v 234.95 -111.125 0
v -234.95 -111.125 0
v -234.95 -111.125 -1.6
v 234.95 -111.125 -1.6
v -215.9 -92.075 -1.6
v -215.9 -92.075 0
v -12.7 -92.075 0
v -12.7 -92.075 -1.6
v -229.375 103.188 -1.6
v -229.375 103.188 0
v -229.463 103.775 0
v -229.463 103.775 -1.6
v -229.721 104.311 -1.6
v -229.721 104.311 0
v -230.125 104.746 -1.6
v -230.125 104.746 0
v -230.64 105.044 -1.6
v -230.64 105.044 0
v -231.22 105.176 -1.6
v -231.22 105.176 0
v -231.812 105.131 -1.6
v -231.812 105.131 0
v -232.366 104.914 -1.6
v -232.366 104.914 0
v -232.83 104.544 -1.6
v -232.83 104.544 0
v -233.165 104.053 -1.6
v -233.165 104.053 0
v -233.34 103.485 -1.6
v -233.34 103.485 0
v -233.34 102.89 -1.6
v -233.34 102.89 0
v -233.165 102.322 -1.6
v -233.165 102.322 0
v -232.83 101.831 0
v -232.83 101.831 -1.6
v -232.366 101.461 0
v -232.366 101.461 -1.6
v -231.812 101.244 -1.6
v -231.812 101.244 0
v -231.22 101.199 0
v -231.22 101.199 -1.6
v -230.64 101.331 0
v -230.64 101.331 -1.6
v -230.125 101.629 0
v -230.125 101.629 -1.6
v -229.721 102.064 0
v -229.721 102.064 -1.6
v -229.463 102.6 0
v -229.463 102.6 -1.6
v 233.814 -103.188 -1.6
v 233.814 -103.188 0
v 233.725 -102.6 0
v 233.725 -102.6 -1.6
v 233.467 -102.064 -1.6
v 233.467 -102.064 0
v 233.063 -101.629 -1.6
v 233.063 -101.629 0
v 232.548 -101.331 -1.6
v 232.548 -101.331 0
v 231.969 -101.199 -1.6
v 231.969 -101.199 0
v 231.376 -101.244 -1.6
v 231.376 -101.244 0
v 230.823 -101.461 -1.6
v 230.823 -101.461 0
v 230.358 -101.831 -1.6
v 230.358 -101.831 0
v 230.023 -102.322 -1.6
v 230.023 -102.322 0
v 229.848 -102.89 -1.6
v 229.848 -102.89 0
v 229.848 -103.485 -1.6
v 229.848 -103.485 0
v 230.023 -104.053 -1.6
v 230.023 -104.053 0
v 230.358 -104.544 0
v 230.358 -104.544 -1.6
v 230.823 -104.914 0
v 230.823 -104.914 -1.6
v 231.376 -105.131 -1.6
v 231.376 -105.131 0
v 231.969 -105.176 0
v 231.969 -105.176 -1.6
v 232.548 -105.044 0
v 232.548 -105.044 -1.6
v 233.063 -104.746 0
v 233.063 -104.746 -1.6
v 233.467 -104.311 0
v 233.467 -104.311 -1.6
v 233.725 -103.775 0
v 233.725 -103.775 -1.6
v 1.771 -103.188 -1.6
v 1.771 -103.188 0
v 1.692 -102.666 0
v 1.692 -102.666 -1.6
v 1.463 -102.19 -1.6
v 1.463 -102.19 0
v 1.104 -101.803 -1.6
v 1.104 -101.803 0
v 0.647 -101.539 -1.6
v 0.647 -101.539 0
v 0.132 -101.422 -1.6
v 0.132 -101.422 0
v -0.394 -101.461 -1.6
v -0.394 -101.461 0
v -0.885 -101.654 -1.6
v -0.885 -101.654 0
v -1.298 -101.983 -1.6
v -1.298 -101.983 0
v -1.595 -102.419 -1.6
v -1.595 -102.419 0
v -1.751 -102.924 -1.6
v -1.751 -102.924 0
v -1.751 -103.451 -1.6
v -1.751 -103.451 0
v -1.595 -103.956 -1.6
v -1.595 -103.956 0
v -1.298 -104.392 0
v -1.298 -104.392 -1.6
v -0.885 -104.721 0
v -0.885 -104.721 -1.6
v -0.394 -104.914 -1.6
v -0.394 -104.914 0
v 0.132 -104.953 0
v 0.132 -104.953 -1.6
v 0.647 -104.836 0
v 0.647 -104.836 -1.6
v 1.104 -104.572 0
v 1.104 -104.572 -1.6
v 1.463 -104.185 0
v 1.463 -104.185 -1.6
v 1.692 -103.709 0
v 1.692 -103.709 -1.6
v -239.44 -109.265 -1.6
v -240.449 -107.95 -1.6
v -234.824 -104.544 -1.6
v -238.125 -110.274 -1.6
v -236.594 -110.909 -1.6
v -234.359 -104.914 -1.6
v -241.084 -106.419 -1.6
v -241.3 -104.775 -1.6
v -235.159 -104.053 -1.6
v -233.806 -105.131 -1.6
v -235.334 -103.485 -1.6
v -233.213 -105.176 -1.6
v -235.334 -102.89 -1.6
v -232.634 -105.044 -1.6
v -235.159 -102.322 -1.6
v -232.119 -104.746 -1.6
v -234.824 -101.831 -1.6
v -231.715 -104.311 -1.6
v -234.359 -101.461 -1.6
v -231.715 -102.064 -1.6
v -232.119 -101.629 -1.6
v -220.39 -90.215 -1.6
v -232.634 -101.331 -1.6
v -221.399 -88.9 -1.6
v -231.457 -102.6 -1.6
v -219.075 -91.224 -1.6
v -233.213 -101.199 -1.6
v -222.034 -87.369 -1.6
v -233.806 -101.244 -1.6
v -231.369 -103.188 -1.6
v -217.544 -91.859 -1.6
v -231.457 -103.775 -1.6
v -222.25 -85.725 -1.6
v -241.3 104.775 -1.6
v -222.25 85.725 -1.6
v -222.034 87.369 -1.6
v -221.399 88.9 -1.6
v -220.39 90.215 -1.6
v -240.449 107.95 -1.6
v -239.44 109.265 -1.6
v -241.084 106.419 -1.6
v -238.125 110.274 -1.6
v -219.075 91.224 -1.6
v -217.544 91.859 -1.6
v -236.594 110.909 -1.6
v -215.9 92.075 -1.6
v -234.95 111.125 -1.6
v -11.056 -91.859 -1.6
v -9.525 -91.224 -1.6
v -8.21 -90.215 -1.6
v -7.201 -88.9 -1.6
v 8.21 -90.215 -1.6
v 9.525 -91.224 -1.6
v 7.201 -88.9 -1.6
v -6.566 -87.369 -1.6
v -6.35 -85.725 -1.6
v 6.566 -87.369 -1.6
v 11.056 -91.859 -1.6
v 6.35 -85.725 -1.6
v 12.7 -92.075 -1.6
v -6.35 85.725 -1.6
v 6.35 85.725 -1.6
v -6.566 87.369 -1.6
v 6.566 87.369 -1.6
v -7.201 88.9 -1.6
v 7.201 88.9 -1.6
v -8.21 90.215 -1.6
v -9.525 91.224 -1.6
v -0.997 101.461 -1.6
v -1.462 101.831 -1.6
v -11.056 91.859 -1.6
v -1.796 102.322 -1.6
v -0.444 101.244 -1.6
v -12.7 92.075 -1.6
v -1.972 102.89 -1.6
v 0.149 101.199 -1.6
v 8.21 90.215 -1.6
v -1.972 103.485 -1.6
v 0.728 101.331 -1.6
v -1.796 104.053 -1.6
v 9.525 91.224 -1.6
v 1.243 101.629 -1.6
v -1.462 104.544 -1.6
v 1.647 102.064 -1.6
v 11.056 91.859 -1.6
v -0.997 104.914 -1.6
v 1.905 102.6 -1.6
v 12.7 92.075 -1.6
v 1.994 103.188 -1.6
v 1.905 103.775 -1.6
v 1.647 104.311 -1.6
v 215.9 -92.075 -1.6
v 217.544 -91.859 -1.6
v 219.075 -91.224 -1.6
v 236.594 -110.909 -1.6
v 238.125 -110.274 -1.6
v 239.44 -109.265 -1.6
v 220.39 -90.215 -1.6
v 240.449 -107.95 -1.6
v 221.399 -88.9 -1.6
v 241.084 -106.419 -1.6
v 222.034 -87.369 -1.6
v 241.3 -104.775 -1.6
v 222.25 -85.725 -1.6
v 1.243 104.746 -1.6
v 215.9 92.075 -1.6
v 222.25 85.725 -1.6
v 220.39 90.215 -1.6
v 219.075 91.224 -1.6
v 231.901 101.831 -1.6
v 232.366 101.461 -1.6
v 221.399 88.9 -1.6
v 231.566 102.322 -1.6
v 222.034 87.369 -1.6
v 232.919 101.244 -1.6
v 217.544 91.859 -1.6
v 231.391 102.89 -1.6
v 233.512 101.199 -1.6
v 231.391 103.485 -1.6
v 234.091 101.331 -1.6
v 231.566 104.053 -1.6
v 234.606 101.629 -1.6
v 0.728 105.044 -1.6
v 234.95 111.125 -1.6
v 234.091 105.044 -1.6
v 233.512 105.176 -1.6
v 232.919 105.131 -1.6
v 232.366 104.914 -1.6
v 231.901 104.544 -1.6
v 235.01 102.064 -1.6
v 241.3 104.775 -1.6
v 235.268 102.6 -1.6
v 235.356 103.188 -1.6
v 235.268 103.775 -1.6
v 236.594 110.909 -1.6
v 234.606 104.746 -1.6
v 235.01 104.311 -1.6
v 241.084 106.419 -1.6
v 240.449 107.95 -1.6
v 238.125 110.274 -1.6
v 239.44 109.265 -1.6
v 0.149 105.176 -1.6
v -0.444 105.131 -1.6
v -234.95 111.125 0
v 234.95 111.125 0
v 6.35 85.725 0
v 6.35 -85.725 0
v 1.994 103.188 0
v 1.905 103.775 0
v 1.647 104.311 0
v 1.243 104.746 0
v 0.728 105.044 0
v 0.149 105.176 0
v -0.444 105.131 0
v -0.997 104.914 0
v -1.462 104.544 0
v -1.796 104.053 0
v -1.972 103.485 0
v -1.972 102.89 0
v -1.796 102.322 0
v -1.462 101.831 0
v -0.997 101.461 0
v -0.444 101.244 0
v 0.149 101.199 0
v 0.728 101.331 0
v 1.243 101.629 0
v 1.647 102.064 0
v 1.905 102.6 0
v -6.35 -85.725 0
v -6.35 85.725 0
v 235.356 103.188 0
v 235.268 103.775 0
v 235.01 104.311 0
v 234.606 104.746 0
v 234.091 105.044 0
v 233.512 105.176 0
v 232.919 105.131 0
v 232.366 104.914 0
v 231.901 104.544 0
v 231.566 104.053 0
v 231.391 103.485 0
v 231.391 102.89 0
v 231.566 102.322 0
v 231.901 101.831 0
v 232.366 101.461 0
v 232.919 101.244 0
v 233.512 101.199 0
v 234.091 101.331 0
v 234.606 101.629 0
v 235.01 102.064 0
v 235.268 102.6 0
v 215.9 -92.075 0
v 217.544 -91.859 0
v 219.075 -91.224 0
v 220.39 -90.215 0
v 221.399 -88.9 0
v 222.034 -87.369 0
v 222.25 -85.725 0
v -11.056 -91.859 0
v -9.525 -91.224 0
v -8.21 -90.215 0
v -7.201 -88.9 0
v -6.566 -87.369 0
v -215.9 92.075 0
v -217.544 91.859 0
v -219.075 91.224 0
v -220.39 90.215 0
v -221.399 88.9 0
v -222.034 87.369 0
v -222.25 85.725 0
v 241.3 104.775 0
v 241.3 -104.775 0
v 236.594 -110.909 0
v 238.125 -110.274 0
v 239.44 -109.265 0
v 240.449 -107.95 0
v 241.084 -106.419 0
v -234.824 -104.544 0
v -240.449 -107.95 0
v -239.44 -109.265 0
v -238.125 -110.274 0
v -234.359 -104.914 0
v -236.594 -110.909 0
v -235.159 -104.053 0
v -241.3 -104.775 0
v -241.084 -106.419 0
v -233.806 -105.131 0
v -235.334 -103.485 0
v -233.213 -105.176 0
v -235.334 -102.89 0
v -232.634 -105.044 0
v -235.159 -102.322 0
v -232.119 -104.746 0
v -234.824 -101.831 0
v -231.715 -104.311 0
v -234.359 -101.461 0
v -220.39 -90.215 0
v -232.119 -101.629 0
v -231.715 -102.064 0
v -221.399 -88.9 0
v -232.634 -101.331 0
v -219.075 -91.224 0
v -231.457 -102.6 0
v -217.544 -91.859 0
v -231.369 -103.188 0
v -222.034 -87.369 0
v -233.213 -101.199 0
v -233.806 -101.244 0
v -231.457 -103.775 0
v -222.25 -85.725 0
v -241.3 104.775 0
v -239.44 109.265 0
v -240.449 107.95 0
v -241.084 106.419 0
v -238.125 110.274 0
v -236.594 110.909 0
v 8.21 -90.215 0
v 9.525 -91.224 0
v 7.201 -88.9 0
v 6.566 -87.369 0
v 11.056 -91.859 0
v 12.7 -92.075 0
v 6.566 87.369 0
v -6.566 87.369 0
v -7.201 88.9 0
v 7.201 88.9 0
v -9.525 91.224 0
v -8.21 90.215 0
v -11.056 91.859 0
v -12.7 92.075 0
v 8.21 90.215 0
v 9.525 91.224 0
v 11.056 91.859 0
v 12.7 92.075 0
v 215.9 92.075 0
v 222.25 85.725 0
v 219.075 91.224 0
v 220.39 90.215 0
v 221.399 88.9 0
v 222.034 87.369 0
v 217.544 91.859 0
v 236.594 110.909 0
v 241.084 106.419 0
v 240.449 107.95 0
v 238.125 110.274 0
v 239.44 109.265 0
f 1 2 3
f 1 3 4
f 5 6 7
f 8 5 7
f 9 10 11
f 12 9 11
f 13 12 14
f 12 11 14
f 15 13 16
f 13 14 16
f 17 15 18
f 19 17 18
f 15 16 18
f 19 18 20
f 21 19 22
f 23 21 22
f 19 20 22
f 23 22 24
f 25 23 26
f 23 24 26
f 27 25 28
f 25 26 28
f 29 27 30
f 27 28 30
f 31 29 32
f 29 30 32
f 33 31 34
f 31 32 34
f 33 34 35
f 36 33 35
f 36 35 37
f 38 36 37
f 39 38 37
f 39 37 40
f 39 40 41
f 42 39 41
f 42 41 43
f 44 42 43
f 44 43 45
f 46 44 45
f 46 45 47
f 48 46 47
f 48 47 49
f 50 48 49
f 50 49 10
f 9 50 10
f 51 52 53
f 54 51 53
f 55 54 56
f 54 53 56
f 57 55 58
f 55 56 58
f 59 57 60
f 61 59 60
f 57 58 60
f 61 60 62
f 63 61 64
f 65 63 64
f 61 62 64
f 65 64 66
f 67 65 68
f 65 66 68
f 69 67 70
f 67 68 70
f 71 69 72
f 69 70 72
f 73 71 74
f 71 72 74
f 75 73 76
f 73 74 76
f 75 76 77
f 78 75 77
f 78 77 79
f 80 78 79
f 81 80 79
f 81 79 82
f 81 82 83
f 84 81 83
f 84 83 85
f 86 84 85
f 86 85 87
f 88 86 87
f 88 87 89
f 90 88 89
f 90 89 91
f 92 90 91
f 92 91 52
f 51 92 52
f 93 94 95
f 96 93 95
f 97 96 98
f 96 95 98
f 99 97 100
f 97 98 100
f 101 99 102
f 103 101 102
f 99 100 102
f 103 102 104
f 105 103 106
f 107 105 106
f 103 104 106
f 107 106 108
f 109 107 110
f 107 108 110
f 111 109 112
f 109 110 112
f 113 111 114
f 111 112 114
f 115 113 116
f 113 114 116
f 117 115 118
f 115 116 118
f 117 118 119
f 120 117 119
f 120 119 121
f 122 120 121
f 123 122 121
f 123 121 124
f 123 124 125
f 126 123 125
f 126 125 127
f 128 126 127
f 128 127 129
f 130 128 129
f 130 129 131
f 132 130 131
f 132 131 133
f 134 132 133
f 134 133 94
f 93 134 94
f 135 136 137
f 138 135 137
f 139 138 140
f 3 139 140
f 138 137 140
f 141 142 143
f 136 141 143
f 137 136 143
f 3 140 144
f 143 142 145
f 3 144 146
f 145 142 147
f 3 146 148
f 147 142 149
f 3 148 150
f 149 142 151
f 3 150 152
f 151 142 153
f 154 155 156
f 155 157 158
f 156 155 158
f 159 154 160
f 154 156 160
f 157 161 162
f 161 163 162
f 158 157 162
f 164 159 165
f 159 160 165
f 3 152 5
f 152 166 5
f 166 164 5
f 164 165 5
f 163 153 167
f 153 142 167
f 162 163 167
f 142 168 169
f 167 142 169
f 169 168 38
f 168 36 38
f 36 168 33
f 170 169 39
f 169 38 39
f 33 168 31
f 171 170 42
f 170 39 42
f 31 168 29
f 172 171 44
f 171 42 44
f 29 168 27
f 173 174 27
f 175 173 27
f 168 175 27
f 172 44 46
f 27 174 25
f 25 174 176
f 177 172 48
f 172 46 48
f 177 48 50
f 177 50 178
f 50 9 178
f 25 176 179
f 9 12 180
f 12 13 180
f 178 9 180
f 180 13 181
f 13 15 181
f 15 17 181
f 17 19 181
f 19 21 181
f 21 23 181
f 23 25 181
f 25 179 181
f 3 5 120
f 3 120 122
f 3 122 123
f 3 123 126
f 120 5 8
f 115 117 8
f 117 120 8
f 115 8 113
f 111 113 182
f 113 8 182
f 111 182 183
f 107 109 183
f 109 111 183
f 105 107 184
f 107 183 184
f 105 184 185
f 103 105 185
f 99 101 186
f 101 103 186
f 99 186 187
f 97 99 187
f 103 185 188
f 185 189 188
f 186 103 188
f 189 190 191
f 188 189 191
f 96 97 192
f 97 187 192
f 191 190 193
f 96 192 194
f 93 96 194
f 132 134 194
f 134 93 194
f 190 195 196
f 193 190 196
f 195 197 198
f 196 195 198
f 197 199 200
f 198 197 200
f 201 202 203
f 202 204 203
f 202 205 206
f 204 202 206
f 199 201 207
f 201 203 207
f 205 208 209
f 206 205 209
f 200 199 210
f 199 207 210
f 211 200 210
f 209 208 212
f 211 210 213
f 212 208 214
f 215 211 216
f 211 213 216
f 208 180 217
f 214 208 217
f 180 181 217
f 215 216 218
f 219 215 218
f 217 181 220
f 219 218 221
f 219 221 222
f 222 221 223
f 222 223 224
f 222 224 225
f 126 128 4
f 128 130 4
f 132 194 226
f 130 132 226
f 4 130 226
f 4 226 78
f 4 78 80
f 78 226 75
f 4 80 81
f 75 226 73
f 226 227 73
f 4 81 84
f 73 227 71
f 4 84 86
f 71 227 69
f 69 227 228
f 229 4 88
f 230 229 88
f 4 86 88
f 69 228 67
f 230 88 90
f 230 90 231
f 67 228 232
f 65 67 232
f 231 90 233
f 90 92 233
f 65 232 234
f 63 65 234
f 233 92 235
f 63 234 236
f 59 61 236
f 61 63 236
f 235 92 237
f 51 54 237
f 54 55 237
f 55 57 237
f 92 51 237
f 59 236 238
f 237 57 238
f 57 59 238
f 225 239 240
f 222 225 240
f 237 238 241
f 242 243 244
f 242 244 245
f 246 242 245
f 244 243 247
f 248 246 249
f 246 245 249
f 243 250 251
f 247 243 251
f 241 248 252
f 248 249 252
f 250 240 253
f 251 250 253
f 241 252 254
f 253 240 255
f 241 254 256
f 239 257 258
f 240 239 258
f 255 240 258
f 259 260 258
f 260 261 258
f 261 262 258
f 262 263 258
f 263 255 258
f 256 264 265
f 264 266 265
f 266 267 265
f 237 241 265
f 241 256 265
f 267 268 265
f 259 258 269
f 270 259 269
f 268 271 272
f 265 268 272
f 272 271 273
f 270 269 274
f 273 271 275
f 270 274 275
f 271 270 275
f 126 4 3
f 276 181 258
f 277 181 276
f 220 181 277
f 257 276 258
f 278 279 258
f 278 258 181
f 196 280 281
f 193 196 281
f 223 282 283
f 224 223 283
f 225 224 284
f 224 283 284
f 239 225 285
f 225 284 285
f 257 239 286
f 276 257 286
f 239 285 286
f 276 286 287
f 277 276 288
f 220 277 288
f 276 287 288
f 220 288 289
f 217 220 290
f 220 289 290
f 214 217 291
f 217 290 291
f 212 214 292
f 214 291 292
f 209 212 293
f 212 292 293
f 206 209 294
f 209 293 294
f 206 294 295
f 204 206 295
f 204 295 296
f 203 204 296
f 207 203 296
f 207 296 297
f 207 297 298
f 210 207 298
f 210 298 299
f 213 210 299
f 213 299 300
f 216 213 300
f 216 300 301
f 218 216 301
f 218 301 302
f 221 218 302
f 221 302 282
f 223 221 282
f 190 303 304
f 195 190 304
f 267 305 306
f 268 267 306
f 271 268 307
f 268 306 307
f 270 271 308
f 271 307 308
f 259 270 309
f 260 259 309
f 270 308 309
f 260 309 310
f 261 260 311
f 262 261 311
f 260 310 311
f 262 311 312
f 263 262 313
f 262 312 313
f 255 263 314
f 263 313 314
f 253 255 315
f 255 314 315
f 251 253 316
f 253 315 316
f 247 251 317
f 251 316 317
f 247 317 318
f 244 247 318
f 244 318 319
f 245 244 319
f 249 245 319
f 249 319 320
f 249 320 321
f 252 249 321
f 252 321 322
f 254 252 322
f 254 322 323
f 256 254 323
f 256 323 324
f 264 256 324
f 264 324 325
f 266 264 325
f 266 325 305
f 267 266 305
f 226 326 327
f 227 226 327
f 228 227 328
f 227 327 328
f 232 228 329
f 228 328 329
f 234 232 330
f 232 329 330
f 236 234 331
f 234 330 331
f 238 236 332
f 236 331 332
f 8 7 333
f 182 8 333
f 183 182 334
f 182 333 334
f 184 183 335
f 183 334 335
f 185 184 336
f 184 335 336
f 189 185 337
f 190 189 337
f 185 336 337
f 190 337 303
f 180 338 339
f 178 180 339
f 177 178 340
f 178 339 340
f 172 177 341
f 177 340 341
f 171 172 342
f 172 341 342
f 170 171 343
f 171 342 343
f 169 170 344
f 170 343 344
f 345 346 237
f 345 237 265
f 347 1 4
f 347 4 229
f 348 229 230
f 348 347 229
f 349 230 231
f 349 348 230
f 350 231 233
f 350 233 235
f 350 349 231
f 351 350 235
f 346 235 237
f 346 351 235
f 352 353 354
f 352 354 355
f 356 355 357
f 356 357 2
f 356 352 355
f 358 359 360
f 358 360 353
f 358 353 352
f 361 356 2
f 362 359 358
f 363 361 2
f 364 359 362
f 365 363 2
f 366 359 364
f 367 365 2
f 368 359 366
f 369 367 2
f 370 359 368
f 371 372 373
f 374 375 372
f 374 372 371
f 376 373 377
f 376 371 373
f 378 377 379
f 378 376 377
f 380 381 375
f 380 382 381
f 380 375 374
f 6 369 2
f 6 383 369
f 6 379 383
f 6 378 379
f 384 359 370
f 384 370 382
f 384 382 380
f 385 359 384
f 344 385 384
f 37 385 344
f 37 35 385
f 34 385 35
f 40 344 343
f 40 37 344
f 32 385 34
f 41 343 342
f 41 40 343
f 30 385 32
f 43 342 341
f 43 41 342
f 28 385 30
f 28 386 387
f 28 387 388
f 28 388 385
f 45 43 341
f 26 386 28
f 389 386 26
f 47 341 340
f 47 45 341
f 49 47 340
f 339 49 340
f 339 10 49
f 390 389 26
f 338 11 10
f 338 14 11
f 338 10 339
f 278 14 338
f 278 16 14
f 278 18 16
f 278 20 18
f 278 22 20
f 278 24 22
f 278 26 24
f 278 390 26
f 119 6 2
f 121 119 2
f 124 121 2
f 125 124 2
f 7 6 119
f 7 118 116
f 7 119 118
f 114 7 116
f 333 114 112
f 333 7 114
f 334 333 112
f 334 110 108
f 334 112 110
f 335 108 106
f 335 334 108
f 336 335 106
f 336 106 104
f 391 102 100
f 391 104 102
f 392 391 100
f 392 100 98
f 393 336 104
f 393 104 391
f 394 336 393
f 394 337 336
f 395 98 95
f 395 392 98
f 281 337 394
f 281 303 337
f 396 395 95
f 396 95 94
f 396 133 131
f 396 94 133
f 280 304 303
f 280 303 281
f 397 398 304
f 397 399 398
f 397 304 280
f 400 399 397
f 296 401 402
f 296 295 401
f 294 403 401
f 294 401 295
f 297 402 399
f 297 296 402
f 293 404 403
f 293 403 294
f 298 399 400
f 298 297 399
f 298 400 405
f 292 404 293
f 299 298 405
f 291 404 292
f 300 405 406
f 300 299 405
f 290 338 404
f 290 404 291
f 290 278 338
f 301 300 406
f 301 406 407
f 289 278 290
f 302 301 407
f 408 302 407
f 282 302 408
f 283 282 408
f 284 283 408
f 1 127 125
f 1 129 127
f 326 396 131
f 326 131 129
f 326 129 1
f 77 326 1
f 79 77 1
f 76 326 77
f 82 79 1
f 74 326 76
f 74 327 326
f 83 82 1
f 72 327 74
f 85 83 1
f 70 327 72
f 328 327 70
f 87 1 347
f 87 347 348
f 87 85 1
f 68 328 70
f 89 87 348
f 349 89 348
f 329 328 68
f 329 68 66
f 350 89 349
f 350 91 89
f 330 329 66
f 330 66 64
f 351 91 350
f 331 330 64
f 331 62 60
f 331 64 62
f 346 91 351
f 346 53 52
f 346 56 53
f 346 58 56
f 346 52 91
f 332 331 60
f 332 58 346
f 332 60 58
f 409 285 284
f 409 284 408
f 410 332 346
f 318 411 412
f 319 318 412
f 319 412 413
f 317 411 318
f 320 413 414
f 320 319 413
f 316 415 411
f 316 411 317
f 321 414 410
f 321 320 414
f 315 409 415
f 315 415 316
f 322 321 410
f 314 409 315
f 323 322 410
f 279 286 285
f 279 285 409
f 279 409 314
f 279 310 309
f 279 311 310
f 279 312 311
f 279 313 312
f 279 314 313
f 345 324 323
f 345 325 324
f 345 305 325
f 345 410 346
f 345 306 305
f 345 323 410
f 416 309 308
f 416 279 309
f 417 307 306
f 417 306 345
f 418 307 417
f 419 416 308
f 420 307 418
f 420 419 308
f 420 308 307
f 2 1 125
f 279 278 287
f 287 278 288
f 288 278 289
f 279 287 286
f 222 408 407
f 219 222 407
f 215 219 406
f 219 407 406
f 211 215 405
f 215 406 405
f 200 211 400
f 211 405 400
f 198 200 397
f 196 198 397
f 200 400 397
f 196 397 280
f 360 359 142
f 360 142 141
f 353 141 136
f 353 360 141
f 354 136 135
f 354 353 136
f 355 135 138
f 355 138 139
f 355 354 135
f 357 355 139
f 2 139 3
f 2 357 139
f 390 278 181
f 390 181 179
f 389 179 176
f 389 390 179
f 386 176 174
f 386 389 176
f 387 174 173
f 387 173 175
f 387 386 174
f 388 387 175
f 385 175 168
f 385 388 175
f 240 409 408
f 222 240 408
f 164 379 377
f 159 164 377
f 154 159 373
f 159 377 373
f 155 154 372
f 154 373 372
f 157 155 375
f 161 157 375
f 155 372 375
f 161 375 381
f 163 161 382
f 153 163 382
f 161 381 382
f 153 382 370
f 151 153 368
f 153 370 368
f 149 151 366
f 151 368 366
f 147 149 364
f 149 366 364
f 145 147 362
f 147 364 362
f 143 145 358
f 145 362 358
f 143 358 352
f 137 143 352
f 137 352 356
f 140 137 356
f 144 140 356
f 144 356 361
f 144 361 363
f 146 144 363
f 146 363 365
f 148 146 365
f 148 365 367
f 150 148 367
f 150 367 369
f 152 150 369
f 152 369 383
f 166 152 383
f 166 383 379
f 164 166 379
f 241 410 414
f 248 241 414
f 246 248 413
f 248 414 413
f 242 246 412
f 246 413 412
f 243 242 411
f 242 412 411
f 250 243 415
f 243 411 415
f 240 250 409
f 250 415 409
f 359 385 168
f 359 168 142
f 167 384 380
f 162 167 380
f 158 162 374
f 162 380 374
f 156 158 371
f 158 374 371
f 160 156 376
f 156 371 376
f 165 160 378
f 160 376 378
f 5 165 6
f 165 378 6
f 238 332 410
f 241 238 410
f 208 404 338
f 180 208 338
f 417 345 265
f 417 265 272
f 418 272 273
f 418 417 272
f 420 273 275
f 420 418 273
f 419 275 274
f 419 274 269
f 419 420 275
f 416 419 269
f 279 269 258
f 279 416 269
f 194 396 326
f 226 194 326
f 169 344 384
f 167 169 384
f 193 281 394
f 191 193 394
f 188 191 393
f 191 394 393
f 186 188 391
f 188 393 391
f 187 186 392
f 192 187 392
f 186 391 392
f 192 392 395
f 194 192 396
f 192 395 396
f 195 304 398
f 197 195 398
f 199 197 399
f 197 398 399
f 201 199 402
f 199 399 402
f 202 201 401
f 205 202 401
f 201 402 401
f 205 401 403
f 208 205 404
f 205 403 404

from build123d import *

# Parameters (mm, degrees)
F1_DEPTH = 1.6002
F3_DEPTH = 1.6012
F4_R     = 1.9939
F4_R_2   = 1.770589
F5_DEPTH = 1.6012


with BuildPart() as f1:
    # F0 (on Top) → F1 (new body)
    with BuildSketch(Plane.XY):
        with BuildLine():
            ThreePointArc((-241.3, -104.775), (-239.440128, -109.265128), (-234.95, -111.125))
            Line((-234.95, -111.125), (234.95, -111.125))
            ThreePointArc((234.95, -111.125), (239.440128, -109.265128), (241.3, -104.775))
            Line((241.3, -104.775), (241.3, 104.775))
            ThreePointArc((241.3, 104.775), (239.440128, 109.265128), (234.95, 111.125))
            Line((234.95, 111.125), (-234.95, 111.125))
            ThreePointArc((-234.95, 111.125), (-239.440128, 109.265128), (-241.3, 104.775))
            Line((-241.3, 104.775), (-241.3, -104.775))
        make_face()
    extrude(amount=-F1_DEPTH)

    # F2 (on face) → F3 (cut, through all)
    with BuildSketch(Plane.XY):
        with BuildLine():
            ThreePointArc((-222.25, -85.725), (-220.390128, -90.215128), (-215.9, -92.075))
            Line((-215.9, -92.075), (-12.7, -92.075))
            ThreePointArc((-12.7, -92.075), (-8.209872, -90.215128), (-6.35, -85.725))
            Line((-6.35, -85.725), (-6.35, 85.725))
            ThreePointArc((-6.35, 85.725), (-8.209872, 90.215128), (-12.7, 92.075))
            Line((-12.7, 92.075), (-215.9, 92.075))
            ThreePointArc((-215.9, 92.075), (-220.390128, 90.215128), (-222.25, 85.725))
            Line((-222.25, 85.725), (-222.25, -85.725))
        make_face()
        with BuildLine():
            ThreePointArc((215.9, -92.075), (220.390128, -90.215128), (222.25, -85.725))
            Line((222.25, -85.725), (222.25, 85.725))
            ThreePointArc((222.25, 85.725), (220.390128, 90.215128), (215.9, 92.075))
            Line((215.9, 92.075), (12.7, 92.075))
            ThreePointArc((12.7, 92.075), (8.209872, 90.215128), (6.35, 85.725))
            Line((6.35, 85.725), (6.35, -85.725))
            ThreePointArc((6.35, -85.725), (8.209872, -90.215128), (12.7, -92.075))
            Line((12.7, -92.075), (215.9, -92.075))
        make_face()
    extrude(amount=-F3_DEPTH, mode=Mode.SUBTRACT)

    # F4 (on face) → F5 (cut, through all)
    with BuildSketch(Plane.XY):
        with Locations((-231.3686, 103.1875)):
            Circle(F4_R)
        with Locations((0, -103.1875)):
            Circle(F4_R_2)
        with Locations((0, 103.1875)):
            Circle(F4_R)
        with Locations((233.3625, 103.1875)):
            Circle(F4_R)
        with Locations((231.819779, -103.1875)):
            Circle(F4_R)
        with Locations((-233.3625, -103.1875)):
            Circle(F4_R)
    extrude(amount=-F5_DEPTH, mode=Mode.SUBTRACT)


solid = f1.part
